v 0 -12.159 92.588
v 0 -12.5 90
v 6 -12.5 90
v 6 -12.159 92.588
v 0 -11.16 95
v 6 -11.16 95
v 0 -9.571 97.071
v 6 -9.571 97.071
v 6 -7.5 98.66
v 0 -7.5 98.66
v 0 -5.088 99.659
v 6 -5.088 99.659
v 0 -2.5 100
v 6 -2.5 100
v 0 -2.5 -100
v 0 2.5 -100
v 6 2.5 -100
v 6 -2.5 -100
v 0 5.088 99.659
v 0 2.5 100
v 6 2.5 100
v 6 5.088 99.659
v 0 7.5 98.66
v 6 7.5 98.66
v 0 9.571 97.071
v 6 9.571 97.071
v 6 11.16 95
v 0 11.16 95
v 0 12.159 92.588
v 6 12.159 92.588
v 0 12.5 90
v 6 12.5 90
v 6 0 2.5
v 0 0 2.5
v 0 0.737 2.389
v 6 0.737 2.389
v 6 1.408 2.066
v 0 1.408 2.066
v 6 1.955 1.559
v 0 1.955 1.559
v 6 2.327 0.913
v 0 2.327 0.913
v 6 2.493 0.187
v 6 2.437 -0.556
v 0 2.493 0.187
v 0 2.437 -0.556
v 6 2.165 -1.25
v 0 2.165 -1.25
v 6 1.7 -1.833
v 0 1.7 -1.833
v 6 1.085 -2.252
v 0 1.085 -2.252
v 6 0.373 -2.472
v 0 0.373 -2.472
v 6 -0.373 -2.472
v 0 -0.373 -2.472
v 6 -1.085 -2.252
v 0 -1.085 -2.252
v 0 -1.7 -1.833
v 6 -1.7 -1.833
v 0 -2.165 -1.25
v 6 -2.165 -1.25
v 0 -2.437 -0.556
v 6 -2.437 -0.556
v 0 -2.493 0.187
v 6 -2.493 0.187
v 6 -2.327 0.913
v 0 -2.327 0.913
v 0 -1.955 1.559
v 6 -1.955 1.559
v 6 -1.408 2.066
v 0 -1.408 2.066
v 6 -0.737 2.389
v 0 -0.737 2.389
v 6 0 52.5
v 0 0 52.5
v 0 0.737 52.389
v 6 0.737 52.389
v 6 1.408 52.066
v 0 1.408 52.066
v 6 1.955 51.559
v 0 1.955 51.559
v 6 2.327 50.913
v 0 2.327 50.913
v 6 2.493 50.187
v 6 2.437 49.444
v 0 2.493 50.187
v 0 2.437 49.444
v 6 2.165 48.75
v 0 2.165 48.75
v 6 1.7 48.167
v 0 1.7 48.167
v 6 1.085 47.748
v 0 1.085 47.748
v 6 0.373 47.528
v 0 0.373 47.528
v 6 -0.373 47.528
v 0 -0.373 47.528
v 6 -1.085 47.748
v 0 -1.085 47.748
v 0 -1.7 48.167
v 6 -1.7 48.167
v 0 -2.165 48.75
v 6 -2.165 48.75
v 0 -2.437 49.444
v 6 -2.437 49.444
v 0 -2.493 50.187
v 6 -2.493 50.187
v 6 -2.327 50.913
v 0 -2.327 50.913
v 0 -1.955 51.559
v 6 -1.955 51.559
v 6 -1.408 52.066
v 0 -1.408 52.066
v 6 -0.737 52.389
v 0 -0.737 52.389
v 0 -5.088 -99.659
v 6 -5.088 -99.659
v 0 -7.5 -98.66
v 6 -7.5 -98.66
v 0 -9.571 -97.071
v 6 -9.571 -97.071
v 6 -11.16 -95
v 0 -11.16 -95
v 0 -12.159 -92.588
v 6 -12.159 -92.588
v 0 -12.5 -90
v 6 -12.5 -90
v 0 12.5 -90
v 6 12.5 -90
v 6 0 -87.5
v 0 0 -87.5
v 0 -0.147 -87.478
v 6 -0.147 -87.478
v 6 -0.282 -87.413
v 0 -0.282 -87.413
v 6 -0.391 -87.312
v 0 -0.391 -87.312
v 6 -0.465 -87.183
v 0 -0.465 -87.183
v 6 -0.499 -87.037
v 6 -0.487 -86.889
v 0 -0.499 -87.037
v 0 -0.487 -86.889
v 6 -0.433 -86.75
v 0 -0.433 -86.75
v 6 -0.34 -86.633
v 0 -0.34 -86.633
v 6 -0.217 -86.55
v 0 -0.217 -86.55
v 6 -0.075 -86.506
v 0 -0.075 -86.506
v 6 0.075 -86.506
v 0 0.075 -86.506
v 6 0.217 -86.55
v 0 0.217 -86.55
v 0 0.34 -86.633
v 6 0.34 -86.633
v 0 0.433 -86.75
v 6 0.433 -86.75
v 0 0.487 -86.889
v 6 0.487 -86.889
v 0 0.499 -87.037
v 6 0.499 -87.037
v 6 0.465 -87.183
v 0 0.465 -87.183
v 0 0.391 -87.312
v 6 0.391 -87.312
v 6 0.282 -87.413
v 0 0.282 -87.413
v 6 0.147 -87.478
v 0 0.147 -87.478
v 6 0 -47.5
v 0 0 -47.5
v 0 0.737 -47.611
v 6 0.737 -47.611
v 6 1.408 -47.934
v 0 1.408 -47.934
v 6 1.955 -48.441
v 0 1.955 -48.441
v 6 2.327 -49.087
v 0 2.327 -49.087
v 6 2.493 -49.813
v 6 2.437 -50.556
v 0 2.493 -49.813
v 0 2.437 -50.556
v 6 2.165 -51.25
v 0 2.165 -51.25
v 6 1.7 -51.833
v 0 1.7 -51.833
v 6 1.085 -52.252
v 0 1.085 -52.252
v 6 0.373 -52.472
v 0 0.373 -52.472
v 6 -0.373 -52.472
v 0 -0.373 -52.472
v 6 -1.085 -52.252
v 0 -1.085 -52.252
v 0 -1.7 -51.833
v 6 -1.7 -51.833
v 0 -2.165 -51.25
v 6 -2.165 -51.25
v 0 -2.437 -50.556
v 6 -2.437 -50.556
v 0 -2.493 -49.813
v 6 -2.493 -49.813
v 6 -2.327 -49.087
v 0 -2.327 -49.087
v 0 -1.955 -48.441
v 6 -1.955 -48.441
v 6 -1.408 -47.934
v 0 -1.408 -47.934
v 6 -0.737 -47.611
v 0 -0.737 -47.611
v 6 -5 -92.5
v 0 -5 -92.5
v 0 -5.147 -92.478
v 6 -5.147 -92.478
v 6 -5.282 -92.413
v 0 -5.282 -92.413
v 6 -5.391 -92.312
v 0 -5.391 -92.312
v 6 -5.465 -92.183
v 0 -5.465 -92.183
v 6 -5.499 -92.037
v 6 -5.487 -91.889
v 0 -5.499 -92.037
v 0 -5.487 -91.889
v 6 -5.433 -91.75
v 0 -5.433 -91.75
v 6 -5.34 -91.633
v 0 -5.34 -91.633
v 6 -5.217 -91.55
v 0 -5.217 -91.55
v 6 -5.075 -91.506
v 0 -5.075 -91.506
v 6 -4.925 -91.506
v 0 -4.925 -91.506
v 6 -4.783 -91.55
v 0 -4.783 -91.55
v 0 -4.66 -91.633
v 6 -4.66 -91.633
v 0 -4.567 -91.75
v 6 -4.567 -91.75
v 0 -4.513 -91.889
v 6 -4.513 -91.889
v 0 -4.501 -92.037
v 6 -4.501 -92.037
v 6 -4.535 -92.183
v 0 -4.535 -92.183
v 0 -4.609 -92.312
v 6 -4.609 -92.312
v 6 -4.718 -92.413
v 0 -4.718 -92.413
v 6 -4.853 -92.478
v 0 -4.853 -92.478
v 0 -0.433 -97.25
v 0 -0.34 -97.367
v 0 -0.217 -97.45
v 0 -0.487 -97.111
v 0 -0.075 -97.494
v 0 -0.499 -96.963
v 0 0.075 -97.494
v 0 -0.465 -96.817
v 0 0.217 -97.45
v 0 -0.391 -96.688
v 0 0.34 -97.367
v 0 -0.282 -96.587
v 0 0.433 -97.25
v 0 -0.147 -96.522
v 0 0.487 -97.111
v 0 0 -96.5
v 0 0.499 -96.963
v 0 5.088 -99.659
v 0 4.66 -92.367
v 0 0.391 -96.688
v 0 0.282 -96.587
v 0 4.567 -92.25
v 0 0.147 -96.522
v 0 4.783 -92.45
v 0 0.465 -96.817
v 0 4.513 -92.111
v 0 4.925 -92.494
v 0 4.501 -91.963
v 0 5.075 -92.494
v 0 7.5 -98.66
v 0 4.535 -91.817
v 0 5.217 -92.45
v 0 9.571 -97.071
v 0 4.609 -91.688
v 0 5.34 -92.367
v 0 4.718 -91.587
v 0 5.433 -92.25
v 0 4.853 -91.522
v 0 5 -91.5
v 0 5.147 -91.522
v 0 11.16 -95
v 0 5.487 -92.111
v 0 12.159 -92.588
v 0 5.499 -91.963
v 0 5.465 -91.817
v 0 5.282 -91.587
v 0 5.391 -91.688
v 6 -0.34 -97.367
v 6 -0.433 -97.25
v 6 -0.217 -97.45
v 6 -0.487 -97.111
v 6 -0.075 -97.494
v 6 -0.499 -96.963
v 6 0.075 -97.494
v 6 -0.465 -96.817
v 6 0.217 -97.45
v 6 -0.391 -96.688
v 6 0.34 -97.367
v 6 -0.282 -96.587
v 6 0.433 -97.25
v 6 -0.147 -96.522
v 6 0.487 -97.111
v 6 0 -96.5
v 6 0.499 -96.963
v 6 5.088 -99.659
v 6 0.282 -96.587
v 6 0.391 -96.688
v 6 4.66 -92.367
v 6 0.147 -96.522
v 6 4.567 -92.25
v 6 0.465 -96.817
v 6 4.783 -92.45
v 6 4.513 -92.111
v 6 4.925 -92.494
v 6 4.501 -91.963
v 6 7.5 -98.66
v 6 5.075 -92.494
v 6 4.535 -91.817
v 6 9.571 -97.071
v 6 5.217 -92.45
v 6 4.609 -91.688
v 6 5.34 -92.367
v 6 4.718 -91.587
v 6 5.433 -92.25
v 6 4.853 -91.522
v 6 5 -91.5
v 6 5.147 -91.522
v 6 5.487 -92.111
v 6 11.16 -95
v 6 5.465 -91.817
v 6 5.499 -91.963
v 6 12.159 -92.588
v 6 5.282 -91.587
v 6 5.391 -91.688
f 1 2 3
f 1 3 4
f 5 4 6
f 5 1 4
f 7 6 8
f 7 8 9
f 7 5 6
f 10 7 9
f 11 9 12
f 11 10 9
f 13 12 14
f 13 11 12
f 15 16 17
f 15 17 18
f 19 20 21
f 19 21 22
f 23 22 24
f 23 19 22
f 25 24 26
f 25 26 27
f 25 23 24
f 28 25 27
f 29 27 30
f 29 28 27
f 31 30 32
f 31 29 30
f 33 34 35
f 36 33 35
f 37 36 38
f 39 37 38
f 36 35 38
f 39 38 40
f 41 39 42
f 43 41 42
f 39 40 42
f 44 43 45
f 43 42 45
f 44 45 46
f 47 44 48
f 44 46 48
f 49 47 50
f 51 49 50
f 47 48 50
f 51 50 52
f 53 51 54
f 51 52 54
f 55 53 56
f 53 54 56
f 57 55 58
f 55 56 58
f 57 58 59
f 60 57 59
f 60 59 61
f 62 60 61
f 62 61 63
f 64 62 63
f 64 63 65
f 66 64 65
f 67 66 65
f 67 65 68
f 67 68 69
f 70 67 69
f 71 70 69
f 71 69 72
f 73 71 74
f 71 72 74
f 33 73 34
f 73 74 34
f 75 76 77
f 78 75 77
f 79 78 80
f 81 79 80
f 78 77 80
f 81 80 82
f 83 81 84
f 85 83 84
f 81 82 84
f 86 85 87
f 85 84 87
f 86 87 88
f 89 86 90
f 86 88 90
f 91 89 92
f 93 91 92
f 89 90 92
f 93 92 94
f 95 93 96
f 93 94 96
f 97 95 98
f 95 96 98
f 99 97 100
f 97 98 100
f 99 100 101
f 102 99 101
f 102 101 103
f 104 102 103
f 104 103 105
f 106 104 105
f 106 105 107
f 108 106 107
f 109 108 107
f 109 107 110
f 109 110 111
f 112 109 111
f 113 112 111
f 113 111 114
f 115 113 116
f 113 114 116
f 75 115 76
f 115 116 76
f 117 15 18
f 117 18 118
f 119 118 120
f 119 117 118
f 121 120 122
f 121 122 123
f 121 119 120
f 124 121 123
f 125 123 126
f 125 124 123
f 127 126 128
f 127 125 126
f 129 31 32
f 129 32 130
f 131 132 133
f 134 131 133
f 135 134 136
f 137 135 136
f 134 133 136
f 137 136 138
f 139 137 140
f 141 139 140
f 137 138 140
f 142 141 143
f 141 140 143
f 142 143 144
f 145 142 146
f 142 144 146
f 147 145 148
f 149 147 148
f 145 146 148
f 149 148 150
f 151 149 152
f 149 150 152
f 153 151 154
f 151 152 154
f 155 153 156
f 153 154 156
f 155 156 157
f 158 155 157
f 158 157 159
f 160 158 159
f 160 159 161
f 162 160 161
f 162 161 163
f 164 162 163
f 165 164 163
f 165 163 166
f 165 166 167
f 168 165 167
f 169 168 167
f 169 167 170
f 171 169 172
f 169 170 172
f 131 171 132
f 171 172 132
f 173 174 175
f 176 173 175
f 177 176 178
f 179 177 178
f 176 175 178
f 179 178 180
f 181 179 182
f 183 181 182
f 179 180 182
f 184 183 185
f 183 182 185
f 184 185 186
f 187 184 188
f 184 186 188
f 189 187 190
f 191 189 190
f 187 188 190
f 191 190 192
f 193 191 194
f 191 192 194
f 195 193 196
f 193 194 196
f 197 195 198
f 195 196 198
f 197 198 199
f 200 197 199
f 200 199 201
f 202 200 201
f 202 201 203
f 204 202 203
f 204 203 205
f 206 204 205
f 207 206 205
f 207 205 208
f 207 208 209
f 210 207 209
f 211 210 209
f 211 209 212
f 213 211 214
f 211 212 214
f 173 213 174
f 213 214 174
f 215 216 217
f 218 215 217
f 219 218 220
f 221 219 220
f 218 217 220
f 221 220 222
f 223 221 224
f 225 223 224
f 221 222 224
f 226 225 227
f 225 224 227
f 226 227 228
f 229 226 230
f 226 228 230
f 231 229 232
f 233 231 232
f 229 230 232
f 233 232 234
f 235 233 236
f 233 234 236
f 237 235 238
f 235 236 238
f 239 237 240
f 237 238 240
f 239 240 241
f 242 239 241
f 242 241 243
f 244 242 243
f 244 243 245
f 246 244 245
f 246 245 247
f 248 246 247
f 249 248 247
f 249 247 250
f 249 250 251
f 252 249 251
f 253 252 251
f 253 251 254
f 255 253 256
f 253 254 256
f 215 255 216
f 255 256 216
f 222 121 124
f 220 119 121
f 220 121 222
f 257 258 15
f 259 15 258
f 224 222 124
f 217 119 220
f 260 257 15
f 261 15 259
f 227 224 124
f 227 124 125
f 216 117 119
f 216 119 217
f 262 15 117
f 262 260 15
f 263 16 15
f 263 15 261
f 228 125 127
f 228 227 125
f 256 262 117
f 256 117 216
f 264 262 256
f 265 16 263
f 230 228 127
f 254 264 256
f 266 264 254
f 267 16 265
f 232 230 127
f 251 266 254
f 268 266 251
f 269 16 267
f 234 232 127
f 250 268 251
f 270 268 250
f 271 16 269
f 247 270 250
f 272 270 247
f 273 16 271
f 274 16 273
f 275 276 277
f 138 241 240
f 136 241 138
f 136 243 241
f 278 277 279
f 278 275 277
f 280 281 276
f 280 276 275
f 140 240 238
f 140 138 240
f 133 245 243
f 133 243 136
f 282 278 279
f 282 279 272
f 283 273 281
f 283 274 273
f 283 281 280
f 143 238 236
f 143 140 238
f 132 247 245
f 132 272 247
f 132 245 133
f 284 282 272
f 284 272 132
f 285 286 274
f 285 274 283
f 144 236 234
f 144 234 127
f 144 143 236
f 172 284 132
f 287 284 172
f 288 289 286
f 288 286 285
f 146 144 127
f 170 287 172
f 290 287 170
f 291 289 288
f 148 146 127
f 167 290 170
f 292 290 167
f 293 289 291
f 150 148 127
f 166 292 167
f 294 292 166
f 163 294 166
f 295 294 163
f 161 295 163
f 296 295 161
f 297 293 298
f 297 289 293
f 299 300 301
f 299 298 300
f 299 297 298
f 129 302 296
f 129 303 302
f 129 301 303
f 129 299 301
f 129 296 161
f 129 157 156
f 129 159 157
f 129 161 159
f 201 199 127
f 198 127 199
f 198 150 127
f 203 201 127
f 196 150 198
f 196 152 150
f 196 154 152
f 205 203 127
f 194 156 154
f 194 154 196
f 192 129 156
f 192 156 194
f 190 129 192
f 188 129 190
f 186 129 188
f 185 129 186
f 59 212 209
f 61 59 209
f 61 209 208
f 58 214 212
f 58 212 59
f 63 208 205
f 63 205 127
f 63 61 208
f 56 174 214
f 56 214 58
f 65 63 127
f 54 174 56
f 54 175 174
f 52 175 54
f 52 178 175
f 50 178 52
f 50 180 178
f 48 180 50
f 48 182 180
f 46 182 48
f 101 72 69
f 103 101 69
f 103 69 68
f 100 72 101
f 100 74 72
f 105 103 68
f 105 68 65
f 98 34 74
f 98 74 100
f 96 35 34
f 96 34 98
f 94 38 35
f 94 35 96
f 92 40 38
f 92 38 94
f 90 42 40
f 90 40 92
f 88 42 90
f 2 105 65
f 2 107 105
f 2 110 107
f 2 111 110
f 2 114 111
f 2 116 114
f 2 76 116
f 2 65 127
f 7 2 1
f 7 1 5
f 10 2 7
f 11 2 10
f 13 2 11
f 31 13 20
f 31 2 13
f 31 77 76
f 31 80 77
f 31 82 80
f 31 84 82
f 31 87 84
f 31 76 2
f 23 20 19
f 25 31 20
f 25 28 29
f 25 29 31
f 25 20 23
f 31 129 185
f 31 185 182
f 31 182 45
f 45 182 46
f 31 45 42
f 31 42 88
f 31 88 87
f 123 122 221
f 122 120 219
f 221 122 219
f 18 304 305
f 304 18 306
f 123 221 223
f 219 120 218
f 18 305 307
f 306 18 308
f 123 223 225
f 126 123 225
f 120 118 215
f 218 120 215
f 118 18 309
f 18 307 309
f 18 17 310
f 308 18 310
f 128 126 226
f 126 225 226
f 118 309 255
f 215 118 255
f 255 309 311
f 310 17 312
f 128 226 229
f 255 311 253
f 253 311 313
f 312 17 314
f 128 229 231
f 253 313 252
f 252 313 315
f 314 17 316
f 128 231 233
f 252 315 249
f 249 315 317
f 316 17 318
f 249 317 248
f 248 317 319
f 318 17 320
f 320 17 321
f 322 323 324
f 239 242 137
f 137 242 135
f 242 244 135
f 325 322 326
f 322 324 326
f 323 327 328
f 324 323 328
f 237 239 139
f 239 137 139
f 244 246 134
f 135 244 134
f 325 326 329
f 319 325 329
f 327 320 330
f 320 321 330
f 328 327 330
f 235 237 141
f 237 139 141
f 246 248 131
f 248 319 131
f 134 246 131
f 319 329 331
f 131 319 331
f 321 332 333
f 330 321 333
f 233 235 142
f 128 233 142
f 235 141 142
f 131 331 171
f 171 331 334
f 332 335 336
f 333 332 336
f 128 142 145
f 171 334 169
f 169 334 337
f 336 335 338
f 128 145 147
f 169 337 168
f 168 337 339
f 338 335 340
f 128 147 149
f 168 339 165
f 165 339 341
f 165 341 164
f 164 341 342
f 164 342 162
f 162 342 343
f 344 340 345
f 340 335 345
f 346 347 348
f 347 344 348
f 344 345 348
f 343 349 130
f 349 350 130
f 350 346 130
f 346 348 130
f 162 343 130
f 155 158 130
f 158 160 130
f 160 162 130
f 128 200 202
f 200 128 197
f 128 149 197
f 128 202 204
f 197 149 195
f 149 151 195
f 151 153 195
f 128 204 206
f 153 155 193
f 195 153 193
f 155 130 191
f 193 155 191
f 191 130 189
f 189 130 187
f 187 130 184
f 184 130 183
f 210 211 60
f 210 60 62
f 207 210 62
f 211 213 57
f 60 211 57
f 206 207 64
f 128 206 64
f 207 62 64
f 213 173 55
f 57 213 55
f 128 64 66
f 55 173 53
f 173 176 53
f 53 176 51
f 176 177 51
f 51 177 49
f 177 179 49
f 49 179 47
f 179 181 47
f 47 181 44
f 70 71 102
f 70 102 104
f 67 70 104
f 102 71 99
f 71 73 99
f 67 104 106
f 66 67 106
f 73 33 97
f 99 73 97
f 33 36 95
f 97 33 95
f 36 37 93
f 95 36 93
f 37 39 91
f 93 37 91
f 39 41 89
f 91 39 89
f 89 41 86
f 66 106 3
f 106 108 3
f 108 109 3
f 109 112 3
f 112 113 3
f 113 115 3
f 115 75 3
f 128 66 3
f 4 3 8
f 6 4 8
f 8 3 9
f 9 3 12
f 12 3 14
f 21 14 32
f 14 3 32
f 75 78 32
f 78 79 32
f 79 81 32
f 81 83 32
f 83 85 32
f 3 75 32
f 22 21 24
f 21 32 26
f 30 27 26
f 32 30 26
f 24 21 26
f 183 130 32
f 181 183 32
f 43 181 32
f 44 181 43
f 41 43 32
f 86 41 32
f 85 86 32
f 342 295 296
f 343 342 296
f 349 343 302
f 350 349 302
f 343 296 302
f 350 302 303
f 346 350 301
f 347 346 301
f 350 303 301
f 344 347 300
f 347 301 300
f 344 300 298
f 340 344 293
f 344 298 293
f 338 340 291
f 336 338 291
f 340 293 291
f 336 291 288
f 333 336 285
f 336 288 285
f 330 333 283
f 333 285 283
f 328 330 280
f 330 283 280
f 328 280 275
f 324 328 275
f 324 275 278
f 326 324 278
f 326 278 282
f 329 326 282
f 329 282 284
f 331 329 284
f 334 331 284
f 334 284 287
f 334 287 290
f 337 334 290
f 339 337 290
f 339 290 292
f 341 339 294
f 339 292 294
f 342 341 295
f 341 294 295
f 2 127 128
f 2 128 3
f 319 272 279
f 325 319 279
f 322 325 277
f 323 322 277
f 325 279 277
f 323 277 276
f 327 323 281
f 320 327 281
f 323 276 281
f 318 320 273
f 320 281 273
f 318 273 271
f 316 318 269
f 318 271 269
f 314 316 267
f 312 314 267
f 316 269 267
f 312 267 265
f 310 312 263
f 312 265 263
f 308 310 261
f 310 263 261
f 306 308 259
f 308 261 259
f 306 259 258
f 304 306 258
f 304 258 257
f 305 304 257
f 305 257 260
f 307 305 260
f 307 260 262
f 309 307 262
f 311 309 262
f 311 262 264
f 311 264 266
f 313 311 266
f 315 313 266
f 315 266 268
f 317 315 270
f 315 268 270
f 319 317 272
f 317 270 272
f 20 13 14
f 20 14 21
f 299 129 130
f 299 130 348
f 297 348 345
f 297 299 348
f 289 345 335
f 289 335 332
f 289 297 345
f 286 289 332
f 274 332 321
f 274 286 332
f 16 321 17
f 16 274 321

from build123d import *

# Parameters (mm, degrees)
BOSS_EXTRU_1_DEPTH      = 6
ESQUISSE2_R             = 0.5
ESQUISSE2_R_2           = 2.5
ENL_V_MAT_EXTRU_1_DEPTH = 6


with BuildPart() as part:
    # Esquisse1 → Boss.-Extru.1 (new body)
    with BuildSketch(Plane(origin=(0, 0, 0), x_dir=(0, 0, -1), z_dir=(1, 0, 0))):
        with BuildLine():
            Line((90, -12.5), (-90, -12.5))
            ThreePointArc((-90, -12.5), (-97.071067812, -9.571067812), (-100, -2.5))
            Line((-100, -2.5), (-100, 2.5))
            ThreePointArc((-100, 2.5), (-97.071067812, 9.571067812), (-90, 12.5))
            Line((-90, 12.5), (90, 12.5))
            ThreePointArc((90, 12.5), (97.071067812, 9.571067812), (100, 2.5))
            Line((100, 2.5), (100, -2.5))
            ThreePointArc((100, -2.5), (97.071067812, -9.571067812), (90, -12.5))
        make_face()
    extrude(amount=BOSS_EXTRU_1_DEPTH)

    # Esquisse2 → Enlèv. mat.-Extru.1 (cut)
    with BuildSketch(Plane.ZY):
        with Locations((-97, 0)):
            Circle(ESQUISSE2_R)
        with Locations((-92, 5)):
            Circle(ESQUISSE2_R)
        with Locations(Location((-92, -5, 0), (0, 0, 180))):
            Circle(ESQUISSE2_R)
        with Locations(Location((-87, 0, 0), (0, 0, 180))):
            Circle(ESQUISSE2_R)
        with Locations((-50, 0)):
            Circle(ESQUISSE2_R_2)
        Circle(ESQUISSE2_R_2)
        with Locations((50, 0)):
            Circle(ESQUISSE2_R_2)
    extrude(amount=-ENL_V_MAT_EXTRU_1_DEPTH, mode=Mode.SUBTRACT)


solid = part.part
